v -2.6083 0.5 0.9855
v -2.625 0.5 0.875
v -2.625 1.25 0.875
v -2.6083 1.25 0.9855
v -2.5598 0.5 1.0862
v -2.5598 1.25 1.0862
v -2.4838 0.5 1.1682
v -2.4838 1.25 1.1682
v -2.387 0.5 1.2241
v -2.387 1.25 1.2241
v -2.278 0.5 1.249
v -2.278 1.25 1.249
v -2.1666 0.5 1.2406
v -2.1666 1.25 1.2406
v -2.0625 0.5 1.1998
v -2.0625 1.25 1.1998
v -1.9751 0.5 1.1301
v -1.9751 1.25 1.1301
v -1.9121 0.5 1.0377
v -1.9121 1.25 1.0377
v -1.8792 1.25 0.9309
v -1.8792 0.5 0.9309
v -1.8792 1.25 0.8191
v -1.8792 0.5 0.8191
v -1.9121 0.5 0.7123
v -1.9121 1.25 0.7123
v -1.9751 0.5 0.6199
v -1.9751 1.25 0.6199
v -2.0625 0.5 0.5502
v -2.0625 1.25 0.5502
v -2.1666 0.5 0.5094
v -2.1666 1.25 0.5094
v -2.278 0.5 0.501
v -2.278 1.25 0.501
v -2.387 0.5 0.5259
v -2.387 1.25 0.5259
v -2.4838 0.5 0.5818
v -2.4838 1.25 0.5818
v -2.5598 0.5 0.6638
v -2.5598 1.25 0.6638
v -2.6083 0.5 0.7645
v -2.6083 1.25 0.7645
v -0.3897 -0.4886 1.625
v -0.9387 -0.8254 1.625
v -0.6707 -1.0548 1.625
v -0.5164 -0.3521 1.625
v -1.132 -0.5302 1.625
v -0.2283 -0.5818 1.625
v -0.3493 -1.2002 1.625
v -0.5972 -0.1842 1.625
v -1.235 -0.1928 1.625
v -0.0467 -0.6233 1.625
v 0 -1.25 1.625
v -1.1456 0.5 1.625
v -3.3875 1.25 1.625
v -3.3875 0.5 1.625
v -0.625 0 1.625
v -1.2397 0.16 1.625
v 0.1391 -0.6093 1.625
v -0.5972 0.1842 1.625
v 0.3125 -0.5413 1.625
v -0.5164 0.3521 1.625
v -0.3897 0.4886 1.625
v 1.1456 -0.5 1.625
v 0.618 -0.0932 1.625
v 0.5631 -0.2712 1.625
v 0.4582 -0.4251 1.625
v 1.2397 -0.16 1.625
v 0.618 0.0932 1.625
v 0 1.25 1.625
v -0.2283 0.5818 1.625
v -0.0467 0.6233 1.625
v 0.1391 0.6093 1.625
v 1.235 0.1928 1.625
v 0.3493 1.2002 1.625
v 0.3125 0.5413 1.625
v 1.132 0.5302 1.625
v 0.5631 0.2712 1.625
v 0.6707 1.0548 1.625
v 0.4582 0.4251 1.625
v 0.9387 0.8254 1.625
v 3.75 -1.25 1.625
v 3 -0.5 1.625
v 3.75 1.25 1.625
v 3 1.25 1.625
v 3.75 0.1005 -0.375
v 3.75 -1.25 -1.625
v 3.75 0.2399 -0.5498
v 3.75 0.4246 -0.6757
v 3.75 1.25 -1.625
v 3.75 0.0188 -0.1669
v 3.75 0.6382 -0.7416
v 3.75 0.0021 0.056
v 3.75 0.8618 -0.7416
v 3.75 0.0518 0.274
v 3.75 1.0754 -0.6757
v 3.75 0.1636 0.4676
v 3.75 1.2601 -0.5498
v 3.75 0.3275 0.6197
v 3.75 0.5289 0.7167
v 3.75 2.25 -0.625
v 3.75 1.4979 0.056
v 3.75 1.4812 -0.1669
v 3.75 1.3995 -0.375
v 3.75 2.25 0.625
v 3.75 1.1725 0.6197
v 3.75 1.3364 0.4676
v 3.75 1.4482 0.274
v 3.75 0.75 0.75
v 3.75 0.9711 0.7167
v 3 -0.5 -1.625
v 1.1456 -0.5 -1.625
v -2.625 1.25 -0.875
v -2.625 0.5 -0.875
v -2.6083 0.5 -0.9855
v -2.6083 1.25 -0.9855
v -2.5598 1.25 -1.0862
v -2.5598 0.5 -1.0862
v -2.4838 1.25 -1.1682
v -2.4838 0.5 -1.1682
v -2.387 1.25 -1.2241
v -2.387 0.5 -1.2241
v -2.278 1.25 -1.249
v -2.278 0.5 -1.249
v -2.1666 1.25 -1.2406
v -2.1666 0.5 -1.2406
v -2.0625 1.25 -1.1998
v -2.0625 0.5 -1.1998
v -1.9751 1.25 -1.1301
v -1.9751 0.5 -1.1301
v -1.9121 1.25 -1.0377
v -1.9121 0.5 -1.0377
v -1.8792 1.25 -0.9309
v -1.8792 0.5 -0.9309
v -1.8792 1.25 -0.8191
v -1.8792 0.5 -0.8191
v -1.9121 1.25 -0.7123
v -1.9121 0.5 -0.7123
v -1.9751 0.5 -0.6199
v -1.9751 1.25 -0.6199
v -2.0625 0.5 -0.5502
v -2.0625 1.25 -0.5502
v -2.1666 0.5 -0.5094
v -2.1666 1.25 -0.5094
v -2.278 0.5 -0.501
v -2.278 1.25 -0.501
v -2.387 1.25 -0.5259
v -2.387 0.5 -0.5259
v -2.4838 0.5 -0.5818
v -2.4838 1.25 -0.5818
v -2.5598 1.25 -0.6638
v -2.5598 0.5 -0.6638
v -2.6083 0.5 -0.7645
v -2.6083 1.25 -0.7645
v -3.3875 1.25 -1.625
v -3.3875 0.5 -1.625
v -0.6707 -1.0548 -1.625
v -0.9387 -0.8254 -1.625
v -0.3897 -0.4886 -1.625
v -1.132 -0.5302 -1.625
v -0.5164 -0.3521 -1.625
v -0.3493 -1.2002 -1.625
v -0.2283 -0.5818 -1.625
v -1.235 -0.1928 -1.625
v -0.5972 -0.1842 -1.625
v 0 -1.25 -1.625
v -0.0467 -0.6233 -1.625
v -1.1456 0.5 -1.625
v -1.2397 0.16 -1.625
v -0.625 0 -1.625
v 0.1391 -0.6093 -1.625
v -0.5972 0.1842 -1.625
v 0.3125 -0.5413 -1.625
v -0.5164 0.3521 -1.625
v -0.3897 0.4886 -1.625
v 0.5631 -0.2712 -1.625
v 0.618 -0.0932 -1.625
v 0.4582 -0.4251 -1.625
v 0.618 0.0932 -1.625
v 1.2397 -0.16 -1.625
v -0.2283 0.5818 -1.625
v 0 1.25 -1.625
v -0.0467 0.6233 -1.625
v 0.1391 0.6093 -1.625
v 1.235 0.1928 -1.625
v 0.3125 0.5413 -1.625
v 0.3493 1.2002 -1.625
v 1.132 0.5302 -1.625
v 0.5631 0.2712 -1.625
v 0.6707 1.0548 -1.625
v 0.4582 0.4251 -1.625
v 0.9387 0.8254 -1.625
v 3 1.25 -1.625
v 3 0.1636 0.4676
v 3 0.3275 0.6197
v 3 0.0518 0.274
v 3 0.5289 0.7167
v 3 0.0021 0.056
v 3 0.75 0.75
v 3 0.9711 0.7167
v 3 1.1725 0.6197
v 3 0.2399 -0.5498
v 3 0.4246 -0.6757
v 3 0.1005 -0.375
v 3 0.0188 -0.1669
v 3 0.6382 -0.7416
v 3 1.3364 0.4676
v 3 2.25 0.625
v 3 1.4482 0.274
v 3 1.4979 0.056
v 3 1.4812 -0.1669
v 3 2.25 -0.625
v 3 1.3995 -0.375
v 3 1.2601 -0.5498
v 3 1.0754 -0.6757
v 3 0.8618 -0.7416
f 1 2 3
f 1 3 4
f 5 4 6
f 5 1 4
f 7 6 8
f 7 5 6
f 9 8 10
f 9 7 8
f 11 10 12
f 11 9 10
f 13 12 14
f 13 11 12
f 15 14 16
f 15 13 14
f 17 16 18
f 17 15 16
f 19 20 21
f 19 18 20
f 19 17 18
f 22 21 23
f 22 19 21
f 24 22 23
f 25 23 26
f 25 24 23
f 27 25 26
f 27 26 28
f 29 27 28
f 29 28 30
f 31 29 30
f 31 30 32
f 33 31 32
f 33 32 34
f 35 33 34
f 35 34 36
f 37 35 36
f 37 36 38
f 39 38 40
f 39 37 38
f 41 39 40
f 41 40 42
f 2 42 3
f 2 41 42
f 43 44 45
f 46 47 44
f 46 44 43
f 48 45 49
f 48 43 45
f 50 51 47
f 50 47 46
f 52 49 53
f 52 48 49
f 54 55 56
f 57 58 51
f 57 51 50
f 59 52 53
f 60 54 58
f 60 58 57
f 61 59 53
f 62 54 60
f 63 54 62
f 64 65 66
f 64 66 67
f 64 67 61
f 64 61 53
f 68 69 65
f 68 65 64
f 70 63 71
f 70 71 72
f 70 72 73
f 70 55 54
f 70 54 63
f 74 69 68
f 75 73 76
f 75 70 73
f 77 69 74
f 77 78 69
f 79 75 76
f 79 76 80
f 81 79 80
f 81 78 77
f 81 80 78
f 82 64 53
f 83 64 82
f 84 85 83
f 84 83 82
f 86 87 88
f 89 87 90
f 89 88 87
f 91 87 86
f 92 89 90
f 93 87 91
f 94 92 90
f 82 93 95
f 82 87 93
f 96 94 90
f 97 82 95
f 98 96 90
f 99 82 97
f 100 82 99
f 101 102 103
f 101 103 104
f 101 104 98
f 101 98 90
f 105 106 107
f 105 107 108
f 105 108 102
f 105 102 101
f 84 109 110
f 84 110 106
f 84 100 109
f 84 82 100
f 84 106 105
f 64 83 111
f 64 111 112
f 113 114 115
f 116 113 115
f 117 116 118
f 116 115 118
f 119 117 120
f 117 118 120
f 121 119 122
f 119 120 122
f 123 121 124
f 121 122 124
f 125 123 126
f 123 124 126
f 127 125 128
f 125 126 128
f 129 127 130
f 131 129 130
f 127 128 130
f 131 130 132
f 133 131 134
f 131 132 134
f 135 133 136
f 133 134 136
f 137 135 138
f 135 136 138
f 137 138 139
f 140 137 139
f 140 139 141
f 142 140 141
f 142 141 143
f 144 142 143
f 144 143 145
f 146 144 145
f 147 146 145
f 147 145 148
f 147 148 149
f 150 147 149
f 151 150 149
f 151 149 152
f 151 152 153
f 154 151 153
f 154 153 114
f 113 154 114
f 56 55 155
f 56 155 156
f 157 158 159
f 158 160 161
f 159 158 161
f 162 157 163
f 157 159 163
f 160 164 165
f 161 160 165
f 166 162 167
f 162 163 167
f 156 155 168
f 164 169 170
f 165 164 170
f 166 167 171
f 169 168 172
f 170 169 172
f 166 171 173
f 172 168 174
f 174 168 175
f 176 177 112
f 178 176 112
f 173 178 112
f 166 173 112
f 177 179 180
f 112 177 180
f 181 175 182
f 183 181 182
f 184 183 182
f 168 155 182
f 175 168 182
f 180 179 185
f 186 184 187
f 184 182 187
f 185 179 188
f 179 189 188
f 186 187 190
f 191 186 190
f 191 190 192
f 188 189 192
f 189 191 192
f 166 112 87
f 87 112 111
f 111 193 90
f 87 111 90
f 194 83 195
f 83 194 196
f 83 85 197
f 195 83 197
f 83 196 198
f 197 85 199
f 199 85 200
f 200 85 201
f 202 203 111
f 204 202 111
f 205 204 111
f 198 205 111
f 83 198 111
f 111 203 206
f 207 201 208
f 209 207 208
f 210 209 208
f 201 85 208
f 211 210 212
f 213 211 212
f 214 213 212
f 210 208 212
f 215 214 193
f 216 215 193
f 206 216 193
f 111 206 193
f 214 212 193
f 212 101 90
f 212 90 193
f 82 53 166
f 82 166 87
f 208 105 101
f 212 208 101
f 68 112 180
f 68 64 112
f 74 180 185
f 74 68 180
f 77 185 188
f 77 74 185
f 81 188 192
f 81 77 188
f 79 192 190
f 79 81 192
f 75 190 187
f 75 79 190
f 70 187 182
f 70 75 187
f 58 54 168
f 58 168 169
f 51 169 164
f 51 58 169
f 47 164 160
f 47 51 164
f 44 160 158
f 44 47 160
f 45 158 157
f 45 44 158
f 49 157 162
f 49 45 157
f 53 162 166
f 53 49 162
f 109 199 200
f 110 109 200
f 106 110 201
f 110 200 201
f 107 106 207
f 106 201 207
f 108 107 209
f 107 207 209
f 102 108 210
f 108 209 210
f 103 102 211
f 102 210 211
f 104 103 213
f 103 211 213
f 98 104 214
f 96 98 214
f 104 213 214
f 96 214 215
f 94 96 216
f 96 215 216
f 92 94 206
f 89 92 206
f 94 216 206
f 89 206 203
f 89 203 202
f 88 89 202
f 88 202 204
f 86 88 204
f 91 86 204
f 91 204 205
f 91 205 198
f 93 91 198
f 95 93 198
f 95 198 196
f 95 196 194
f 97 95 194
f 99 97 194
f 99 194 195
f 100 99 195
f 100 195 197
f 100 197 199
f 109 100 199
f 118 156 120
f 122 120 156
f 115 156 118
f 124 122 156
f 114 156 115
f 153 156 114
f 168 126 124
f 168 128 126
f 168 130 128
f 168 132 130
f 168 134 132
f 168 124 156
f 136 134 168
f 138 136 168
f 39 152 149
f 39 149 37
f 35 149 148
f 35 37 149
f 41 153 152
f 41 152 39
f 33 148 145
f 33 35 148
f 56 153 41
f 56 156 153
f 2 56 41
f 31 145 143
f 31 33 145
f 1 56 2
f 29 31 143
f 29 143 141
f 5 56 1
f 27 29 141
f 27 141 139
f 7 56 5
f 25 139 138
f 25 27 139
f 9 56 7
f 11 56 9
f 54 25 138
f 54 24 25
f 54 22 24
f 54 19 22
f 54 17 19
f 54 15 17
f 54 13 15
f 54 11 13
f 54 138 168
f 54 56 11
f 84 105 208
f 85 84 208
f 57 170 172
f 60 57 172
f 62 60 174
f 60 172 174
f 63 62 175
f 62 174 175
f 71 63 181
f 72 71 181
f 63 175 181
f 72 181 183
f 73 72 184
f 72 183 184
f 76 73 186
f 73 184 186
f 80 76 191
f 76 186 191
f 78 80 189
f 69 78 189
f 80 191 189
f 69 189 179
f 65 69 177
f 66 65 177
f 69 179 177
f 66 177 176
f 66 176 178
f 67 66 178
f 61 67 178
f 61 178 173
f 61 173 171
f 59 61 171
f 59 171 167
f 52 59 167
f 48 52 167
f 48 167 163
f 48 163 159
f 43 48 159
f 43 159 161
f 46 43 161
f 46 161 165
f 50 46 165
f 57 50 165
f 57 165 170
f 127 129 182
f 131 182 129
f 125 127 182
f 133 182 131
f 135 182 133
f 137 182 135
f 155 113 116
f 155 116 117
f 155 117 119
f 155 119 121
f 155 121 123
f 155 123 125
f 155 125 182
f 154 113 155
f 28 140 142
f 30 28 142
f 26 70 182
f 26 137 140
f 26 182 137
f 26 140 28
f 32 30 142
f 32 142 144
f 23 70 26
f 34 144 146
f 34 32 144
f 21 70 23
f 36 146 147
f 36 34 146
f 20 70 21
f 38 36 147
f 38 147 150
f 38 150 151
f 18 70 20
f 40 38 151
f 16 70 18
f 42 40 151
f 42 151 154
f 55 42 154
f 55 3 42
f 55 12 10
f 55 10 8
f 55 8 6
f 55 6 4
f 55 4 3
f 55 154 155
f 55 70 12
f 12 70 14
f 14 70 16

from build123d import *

# Parameters (mm, degrees)
BOSS_EXTRUDE2_DEPTH            = 1.625
SKETCH4_W                      = 3.25
SKETCH4_H                      = 3.5
BOSS_EXTRUDE3_DEPTH            = 0.75
CHAMFER1_SIZE                  = 1
F_1_25_1_25_DIAMETER_HOLE1_D   = 1.25
F_1_5_1_5_DIAMETER_HOLE1_D     = 1.5
F_1_5_1_5_DIAMETER_HOLE1_DEPTH = 0.75
F_0_75_0_75_DIAMETER_HOLE1_D   = 0.75


with BuildPart() as part:
    # Sketch3 → Boss-Extrude2 (new, symmetric)
    with BuildSketch(Plane.XY):
        with BuildLine():
            Line((0, 1.25), (-3.3875, 1.25))
            Line((-3.3875, 1.25), (-3.3875, 0.5))
            Line((-3.3875, 0.5), (-1.145643924, 0.5))
            ThreePointArc((-1.145643924, 0.5), (-1.045825033, -0.684653197), (0, -1.25))
            Line((0, -1.25), (3.75, -1.25))
            Line((3.75, -1.25), (3.75, -0.5))
            Line((3.75, -0.5), (1.145643924, -0.5))
            ThreePointArc((1.145643924, -0.5), (1.045825033, 0.684653197), (0, 1.25))
        make_face()
    extrude(amount=BOSS_EXTRUDE2_DEPTH, both=True)

    # Sketch4 → Boss-Extrude3 (add)
    with BuildSketch(Plane(origin=(3.75, 0, 0), x_dir=(0, 0, -1), z_dir=(1, 0, 0))):
        with Locations((0, 0.5)):
            Rectangle(SKETCH4_W, SKETCH4_H)
    extrude(amount=-BOSS_EXTRUDE3_DEPTH)

    # Chamfer1
    chamfer1_edges = [part.edges().sort_by_distance(p)[0] for p in [
        (3.375, 2.25, -1.625),
        (3.375, 2.25, 1.625),
    ]]
    chamfer(chamfer1_edges, length=CHAMFER1_SIZE)

    # Ø1.25 (1.25) Diameter Hole1 (through all)
    with Locations(Plane.XY.offset(1.625)):
        with Locations((0, 0)):
            Hole(F_1_25_1_25_DIAMETER_HOLE1_D / 2)

    # Ø1.5 (1.5) Diameter Hole1
    with Locations(Plane(origin=(3.75, 0, 0), x_dir=(0, 0, -1), z_dir=(1, 0, 0))):
        with Locations((0, 0.75)):
            Hole(F_1_5_1_5_DIAMETER_HOLE1_D / 2, depth=F_1_5_1_5_DIAMETER_HOLE1_DEPTH)

    # Ø0.75 (0.75) Diameter Hole1 (through all)
    with Locations(Plane(origin=(0, 1.25, 0), x_dir=(1, 0, 0), z_dir=(0, 1, 0))):
        with Locations((-2.25, 0.875)):
            f_0_75_0_75_diameter_hole1 = Hole(F_0_75_0_75_DIAMETER_HOLE1_D / 2)

    # Mirror1: Ø0.75 (0.75) Diameter Hole1 across plane
    add(f_0_75_0_75_diameter_hole1.mirror(Plane.XY), mode=Mode.SUBTRACT)


solid = part.part
